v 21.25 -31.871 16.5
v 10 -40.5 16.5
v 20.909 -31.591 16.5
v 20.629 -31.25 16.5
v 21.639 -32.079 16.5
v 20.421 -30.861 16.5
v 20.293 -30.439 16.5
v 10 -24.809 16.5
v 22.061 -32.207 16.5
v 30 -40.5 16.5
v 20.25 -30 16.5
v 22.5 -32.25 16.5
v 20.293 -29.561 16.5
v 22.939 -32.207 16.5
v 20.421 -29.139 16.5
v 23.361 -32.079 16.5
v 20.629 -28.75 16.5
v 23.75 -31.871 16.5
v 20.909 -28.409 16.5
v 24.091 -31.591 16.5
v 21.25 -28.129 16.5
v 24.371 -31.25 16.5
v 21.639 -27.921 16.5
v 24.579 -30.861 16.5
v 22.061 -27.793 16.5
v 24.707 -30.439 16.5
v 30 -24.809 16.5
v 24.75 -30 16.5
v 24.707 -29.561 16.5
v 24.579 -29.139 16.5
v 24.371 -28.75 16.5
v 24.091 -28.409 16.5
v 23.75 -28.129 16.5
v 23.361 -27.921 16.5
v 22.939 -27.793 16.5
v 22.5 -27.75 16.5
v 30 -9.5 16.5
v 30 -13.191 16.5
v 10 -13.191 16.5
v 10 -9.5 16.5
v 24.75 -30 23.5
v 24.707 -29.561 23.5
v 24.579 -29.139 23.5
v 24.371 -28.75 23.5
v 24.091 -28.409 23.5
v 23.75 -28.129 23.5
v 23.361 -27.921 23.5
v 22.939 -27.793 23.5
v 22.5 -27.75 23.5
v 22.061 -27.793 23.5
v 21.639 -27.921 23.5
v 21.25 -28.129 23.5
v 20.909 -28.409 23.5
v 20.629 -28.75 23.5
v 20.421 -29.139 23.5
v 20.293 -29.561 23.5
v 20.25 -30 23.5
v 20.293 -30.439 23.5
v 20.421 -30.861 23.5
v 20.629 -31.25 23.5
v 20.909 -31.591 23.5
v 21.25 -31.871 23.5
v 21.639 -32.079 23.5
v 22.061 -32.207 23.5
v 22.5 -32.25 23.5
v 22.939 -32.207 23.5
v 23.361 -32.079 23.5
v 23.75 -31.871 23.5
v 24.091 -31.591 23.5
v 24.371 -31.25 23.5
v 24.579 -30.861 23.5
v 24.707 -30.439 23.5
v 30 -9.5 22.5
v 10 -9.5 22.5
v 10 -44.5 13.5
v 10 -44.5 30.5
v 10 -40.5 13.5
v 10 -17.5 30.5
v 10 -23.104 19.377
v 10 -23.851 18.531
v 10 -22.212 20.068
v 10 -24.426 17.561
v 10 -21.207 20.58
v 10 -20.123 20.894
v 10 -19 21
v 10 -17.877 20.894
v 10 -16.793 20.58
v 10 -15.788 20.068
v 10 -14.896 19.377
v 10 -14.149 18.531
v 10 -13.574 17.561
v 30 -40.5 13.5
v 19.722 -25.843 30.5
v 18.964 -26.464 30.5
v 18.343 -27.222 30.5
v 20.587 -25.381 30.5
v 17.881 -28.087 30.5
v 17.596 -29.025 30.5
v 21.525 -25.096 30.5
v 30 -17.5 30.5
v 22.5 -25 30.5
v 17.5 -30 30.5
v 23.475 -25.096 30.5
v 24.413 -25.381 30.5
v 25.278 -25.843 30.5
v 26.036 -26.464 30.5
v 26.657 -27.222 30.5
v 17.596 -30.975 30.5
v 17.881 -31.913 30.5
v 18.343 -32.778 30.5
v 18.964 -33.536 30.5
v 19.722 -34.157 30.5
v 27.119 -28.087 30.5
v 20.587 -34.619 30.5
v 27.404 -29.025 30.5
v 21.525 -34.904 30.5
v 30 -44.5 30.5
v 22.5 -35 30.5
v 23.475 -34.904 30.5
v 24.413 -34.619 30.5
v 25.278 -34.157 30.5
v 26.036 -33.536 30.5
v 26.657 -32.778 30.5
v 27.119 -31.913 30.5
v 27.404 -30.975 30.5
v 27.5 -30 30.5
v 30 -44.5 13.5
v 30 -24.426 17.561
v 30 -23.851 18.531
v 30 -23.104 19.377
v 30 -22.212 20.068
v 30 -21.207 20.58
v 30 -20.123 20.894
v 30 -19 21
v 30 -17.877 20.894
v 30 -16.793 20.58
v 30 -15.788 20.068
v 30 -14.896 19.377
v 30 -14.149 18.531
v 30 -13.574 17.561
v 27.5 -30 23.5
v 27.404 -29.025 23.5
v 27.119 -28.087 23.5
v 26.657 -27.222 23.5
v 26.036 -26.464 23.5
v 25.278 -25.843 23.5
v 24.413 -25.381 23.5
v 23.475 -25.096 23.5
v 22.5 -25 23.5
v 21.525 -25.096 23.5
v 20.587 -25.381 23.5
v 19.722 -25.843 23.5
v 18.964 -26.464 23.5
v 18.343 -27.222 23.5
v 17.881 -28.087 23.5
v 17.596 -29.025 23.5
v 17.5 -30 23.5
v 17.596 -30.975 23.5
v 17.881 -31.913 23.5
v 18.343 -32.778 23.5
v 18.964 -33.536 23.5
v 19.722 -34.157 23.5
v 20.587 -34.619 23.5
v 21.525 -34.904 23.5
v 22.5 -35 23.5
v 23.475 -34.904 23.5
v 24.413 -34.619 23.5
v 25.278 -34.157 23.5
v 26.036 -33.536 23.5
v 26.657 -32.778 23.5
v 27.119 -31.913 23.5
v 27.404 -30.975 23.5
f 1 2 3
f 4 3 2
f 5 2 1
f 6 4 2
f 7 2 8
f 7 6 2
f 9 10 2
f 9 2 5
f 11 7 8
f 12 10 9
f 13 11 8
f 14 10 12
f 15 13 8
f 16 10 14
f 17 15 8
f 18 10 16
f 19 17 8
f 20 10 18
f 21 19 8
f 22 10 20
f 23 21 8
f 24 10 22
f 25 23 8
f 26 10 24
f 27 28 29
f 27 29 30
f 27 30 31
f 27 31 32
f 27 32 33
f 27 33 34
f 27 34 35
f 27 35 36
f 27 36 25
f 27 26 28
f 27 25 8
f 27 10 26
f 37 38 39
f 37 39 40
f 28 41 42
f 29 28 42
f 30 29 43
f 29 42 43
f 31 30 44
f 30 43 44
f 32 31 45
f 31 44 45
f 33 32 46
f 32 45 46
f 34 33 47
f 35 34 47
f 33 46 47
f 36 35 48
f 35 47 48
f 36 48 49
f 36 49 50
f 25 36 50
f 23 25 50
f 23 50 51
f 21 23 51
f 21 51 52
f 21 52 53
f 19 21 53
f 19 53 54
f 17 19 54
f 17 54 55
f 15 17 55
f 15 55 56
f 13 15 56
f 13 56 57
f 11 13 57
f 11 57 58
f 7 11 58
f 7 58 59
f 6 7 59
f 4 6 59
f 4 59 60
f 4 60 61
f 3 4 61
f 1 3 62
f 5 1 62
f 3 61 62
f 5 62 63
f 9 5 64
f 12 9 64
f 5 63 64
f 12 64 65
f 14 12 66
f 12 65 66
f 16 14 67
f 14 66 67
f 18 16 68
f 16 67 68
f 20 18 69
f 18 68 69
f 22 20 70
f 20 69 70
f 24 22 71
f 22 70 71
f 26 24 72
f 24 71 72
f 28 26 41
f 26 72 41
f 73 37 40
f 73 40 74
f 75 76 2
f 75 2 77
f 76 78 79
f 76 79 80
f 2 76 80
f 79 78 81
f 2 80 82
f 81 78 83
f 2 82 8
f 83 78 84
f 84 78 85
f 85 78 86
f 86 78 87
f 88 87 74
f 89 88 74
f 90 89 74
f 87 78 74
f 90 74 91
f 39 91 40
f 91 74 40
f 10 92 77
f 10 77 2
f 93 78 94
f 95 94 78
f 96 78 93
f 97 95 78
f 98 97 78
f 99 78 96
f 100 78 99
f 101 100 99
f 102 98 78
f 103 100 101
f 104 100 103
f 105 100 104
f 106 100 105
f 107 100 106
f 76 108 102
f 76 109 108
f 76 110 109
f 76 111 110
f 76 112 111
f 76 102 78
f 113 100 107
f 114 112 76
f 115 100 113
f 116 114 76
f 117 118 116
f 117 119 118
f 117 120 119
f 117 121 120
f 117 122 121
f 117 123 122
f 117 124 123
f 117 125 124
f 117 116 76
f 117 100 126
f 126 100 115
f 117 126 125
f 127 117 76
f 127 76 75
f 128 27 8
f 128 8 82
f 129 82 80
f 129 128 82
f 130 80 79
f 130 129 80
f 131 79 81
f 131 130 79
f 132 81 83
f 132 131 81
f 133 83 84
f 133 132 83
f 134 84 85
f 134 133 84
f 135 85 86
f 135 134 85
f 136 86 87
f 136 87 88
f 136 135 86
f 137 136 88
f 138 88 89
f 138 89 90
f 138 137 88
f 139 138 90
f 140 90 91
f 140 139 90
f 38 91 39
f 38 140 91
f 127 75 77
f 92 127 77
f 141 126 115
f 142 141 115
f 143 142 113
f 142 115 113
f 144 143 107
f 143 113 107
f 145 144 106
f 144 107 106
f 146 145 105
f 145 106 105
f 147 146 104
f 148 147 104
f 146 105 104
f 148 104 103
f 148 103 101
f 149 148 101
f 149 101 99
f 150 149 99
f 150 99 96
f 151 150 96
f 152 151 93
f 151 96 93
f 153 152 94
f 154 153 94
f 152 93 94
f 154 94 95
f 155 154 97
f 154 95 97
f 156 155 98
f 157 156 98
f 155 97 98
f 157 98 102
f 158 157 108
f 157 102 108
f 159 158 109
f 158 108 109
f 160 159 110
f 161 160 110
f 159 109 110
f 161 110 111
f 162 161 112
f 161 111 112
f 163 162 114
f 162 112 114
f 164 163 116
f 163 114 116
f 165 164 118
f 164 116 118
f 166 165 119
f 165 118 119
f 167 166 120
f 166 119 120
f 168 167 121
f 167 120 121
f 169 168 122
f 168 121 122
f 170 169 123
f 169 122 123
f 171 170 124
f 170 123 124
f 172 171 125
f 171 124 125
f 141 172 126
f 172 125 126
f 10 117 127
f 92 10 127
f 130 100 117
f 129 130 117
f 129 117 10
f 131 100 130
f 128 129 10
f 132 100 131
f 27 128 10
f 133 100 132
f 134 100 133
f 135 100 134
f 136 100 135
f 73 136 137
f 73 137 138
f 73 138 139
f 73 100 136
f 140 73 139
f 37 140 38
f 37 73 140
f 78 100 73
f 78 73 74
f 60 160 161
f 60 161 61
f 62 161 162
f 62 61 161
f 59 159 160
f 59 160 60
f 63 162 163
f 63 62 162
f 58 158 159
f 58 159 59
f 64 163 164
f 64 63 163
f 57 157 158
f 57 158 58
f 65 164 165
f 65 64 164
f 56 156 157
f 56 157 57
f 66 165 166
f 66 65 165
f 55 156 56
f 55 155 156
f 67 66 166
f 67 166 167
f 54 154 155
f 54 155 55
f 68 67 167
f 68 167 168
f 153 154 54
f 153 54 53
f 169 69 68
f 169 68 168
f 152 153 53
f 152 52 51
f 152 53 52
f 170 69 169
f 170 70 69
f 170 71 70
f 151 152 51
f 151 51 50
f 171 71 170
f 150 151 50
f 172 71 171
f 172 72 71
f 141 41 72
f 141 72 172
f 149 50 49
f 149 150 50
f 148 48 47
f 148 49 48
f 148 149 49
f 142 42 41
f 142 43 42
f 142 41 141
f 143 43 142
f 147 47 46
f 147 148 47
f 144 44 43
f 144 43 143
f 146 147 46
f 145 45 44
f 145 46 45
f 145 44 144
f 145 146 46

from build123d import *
from build123d.topology import SkipClean

# Parameters (mm, degrees)
SKETCH1_W           = 30
SKETCH1_H           = 59
SKETCH1_R           = 7
BOSS_EXTRUDE1_DEPTH = 30
CUT_EXTRUDE1_START  = -14.5
SKETCH2_W           = 30
SKETCH2_H           = 2
CUT_EXTRUDE1_DEPTH  = 4
BOSS_EXTRUDE2_START = 12
SKETCH4_W           = 45
SKETCH4_H           = 59
SKETCH4_R           = 7
BOSS_EXTRUDE2_DEPTH = 12
SKETCH5_R           = 8
CUT_EXTRUDE3_DEPTH  = 8.5
SKETCH8_R           = 10
CUT_EXTRUDE5_DEPTH  = 3.5
BOSS_EXTRUDE4_START = 1.5
BOSS_EXTRUDE4_DEPTH = 1.5
SKETCH12_R          = 6
CUT_EXTRUDE7_DEPTH  = 22
CHAMFER1_SIZE       = 2
MOVE_FACE1_BY       = 1
SKETCH16_W          = 1
SKETCH16_H          = 8
BOSS_EXTRUDE5_DEPTH = 15
SKETCH14_R          = 2.25
CUT_EXTRUDE9_DEPTH  = 70.083283072
BOSS_EXTRUDE6_DEPTH = 20
SKETCH18_R          = 5
CUT_EXTRUDE10_DEPTH = 3
SKETCH19_R          = 2.25
CUT_EXTRUDE11_DEPTH = 81.873357789
SKETCH20_R          = 5
CUT_EXTRUDE12_DEPTH = 7
CHAMFER2_SIZE       = 8
CUT_EXTRUDE13_DEPTH = 2
SKETCH22_R          = 3.3
CUT_EXTRUDE14_DEPTH = 15
CUT_EXTRUDE15_START = -3
CUT_EXTRUDE15_DEPTH = 7
SKETCH24_W          = 8
SKETCH24_H          = 4
SKETCH24_W_2        = 4
SKETCH24_H_2        = 8
BOSS_EXTRUDE7_DEPTH = 4
CUT_EXTRUDE16_START = -31.5
CUT_EXTRUDE16_DEPTH = 31.5


with BuildPart() as part:
    # Sketch1 → Boss-Extrude1 (new body)
    with BuildSketch(Plane.XY):
        with Locations((0, -15)):
            Rectangle(SKETCH1_W, SKETCH1_H)
        Circle(SKETCH1_R, mode=Mode.SUBTRACT)
    extrude(amount=-BOSS_EXTRUDE1_DEPTH)

    # Sketch2 → Cut-Extrude1 (cut, symmetric)
    with BuildSketch(Plane.XZ.offset(44.5).offset(CUT_EXTRUDE1_START)):
        with Locations((0, -29)):
            Rectangle(SKETCH2_W, SKETCH2_H)
    extrude(amount=CUT_EXTRUDE1_DEPTH, both=True, mode=Mode.SUBTRACT)

    # Sketch4 → Boss-Extrude2 (add)
    with BuildSketch(Plane.XY.offset(BOSS_EXTRUDE2_START)):
        with Locations((7.5, -15)):
            Rectangle(SKETCH4_W, SKETCH4_H)
        Circle(SKETCH4_R, mode=Mode.SUBTRACT)
    extrude(amount=-BOSS_EXTRUDE2_DEPTH)

    # Sketch5 → Cut-Extrude3 (cut)
    with BuildSketch(Plane.XY.offset(12)):
        Circle(SKETCH5_R)
    extrude(amount=-CUT_EXTRUDE3_DEPTH, mode=Mode.SUBTRACT)

    # Sketch8 → Cut-Extrude5 (cut)
    with BuildSketch(Plane.XY.offset(12)):
        Circle(SKETCH8_R)
    extrude(amount=-CUT_EXTRUDE5_DEPTH, mode=Mode.SUBTRACT)

    # Sketch11 → Boss-Extrude4 (add)
    with SkipClean():  # the faces are left unmerged after this step: merging them gives an invalid solid
        with BuildSketch(Plane.XY.offset(12).offset(BOSS_EXTRUDE4_START)):
            with BuildLine():
                Line((30, 14.5), (8, 14.5))
                Line((8, 14.5), (8, 6))
                ThreePointArc((8, 6), (10, 0), (8, -6))
                Line((8, -6), (8, -44.5))
                Line((8, -44.5), (30, -44.5))
                Line((30, -44.5), (30, 14.5))
            make_face()
        extrude(amount=-BOSS_EXTRUDE4_DEPTH)

    # Sketch12 → Cut-Extrude7 (cut)
    with SkipClean():  # the faces are left unmerged after this step: merging them gives an invalid solid
        with BuildSketch(Plane(origin=(30, 0, 0), x_dir=(0, 0, -1), z_dir=(1, 0, 0))):
            with Locations((-15, -19)):
                Circle(SKETCH12_R)
        extrude(amount=-CUT_EXTRUDE7_DEPTH, mode=Mode.SUBTRACT)

    # Chamfer1
    # the kernel refuses this chamfer: 2 mm, written as the material it adds along each edge
    with BuildSketch(Plane(origin=(8, -19.052786447, 12), x_dir=(-0.9996219169112968, 0, -0.027495876610586487), z_dir=(0, -1, 0))) as chamfer1_piece_1_section:
        Polygon((CHAMFER1_SIZE * 0.999621916911, -CHAMFER1_SIZE * 0.0274958766106), (-CHAMFER1_SIZE * 0.0274958766106, -CHAMFER1_SIZE * 0.999621916911), (0, 0), align=None)
    chamfer1_piece_1 = extrude(amount=25.447213553, mode=Mode.PRIVATE)
    chamfer1_piece_1 = chamfer1_piece_1 - Plane(origin=(7.298262976, -19, 15), x_dir=(0, 0, -1), z_dir=(1, 0, 0)) * Cylinder(6, 59, mode=Mode.PRIVATE)
    chamfer1_piece_1 = split(chamfer1_piece_1, bisect_by=Plane(origin=(7.298262976, -34.489945177, 13.5), z_dir=(0, 0, -1)), keep=Keep.TOP, mode=Mode.PRIVATE)
    add(chamfer1_piece_1)
    with BuildSketch(Plane(origin=(8, 14.5, 12), x_dir=(-0.9996219169112968, 0, -0.027495876610586487), z_dir=(0, -1, 0))) as chamfer1_piece_2_section:
        Polygon((CHAMFER1_SIZE * 0.999621916911, -CHAMFER1_SIZE * 0.0274958766106), (-CHAMFER1_SIZE * 0.0274958766106, -CHAMFER1_SIZE * 0.999621916911), (0, 0), align=None)
    chamfer1_piece_2 = extrude(amount=13.643365976, mode=Mode.PRIVATE)
    chamfer1_piece_2 = chamfer1_piece_2 - Plane(origin=(0, 0, 12.610971558), x_dir=(1, 0, 0), z_dir=(0, 0, 1)) * Cylinder(10, 36, mode=Mode.PRIVATE)
    chamfer1_piece_2 = split(chamfer1_piece_2, bisect_by=Plane(origin=(7.329577736, 10.634975656, 13.5), z_dir=(0, 0, -1)), keep=Keep.TOP, mode=Mode.PRIVATE)
    add(chamfer1_piece_2)
    with BuildSketch(Plane(origin=(8, -0.856634024, 12), x_dir=(-0.9996219169112968, 0, -0.027495876610586487), z_dir=(0, -1, 0))) as chamfer1_piece_3_section:
        Polygon((CHAMFER1_SIZE * 0.999621916911, -CHAMFER1_SIZE * 0.0274958766106), (-CHAMFER1_SIZE * 0.0274958766106, -CHAMFER1_SIZE * 0.999621916911), (0, 0), align=None)
    chamfer1_piece_3 = extrude(amount=18.090579529, mode=Mode.PRIVATE)
    chamfer1_piece_3 = chamfer1_piece_3 - Plane(origin=(7.328722349, -19, 15), x_dir=(0, 0, -1), z_dir=(1, 0, 0)) * Cylinder(6, 45, mode=Mode.PRIVATE)
    chamfer1_piece_3 = chamfer1_piece_3 - Plane(origin=(0, 0, 12.602221716), x_dir=(1, 0, 0), z_dir=(0, 0, 1)) * Cylinder(10, 45, mode=Mode.PRIVATE)
    chamfer1_piece_3 = split(chamfer1_piece_3, bisect_by=Plane(origin=(7.328722349, -10.144229593, 13.5), z_dir=(0, 0, -1)), keep=Keep.TOP, mode=Mode.PRIVATE)
    add(chamfer1_piece_3)

    # Move Face1: a face moved outward by 1.0
    extrude(part.faces().sort_by_distance((8, -19, 10.769879029))[0], amount=MOVE_FACE1_BY, dir=(1, 0, 0))

    # Sketch16 → Boss-Extrude5 (add)
    with BuildSketch(Plane(origin=(30, 0, 0), x_dir=(0, 0, -1), z_dir=(1, 0, 0))):
        with Locations((0.5, 0)):
            Rectangle(SKETCH16_W, SKETCH16_H)
        with Locations((0.5, -30)):
            Rectangle(SKETCH16_W, SKETCH16_H)
    extrude(amount=-BOSS_EXTRUDE5_DEPTH)

    # Sketch14 → Cut-Extrude9 (cut, through all)
    with BuildSketch(Plane.XY.offset(13.5)):
        with Locations((22.5, 0)):
            Circle(SKETCH14_R)
        with Locations((22.5, -30)):
            Circle(SKETCH14_R)
    extrude(amount=-CUT_EXTRUDE9_DEPTH, mode=Mode.SUBTRACT)

    # Sketch18 → Cut-Extrude10 (cut)
    with BuildSketch(Plane.XY.offset(13.5)):
        with Locations((22.5, 0)):
            Circle(SKETCH18_R)
    extrude(amount=-CUT_EXTRUDE10_DEPTH, mode=Mode.SUBTRACT)

    # Sketch21 → Cut-Extrude13 (cut)
    with BuildSketch(Plane(origin=(15, 0, 0), x_dir=(0, 0, -1), z_dir=(1, 0, 0))):
        Polygon((0, 9), (10, 9), (10, -9), (0, -9), (0, -4), (1, -4), (1, 4), (0, 4), align=None)
        Polygon((0, -21), (10, -21), (10, -39), (0, -39), (0, -34), (1, -34), (1, -26), (0, -26), align=None)
    extrude(amount=-CUT_EXTRUDE13_DEPTH, mode=Mode.SUBTRACT)

    # Sketch22 → Cut-Extrude14 (cut)
    with BuildSketch(Plane(origin=(0, 0, -28), x_dir=(-1, 0, 0), z_dir=(0, 0, -1))):
        with Locations((-0.001598667, -30)):
            Circle(SKETCH22_R)
    extrude(amount=-CUT_EXTRUDE14_DEPTH, mode=Mode.SUBTRACT)

    # Sketch23 → Cut-Extrude15 (cut)
    with BuildSketch(Plane(origin=(0, 0, -28), x_dir=(-1, 0, 0), z_dir=(0, 0, -1)).offset(CUT_EXTRUDE15_START)):
        Polygon((-5.101598667, -32.944486373), (-5.101598667, -44.5), (5.098401333, -44.5), (5.098401333, -32.944486373), (5.098401333, -27.055513627), (-0.001598667, -24.111027254), (-5.101598667, -27.055513627), align=None)
    extrude(amount=-CUT_EXTRUDE15_DEPTH, mode=Mode.SUBTRACT)

    # Sketch24 → Boss-Extrude7 (add)
    with BuildSketch(Plane(origin=(15, 0, 0), x_dir=(0, 0, -1), z_dir=(1, 0, 0))):
        with Locations((15, 12.5)):
            Rectangle(SKETCH24_W, SKETCH24_H)
        with Locations((28, 0)):
            Rectangle(SKETCH24_W_2, SKETCH24_H_2)
    extrude(amount=BOSS_EXTRUDE7_DEPTH)

    # Sketch25 → Cut-Extrude16 (cut)
    with BuildSketch(Plane(origin=(0, 0, -30), x_dir=(-1, 0, 0), z_dir=(0, 0, -1)).offset(CUT_EXTRUDE16_START)):
        with BuildLine():
            Line((-8.191520443, 5.735764364), (-12.207745888, 0))
            Line((-12.207745888, 0), (-8.191520443, -5.735764364))
            ThreePointArc((-8.191520443, -5.735764364), (10, 0), (-8.191520443, 5.735764364))
        make_face()
    extrude(amount=CUT_EXTRUDE16_DEPTH, mode=Mode.SUBTRACT)


with BuildPart() as body_2:
    # Sketch17 → Boss-Extrude6 (new body)
    with BuildSketch(Plane(origin=(30, 0, 0), x_dir=(0, 0, -1), z_dir=(1, 0, 0))):
        with BuildLine():
            Line((-16.5, -13.190524981), (-16.5, -9.5))
            Line((-16.5, -9.5), (-30.5, -9.5))
            Line((-30.5, -9.5), (-30.5, -44.5))
            Line((-30.5, -44.5), (-13.5, -44.5))
            Line((-13.5, -44.5), (-13.5, -40.5))
            Line((-13.5, -40.5), (-16.5, -40.5))
            Line((-16.5, -40.5), (-16.5, -24.809475019))
            ThreePointArc((-16.5, -24.809475019), (-21, -19), (-16.5, -13.190524981))
        make_face()
    extrude(amount=-BOSS_EXTRUDE6_DEPTH)

    # Sketch19 → Cut-Extrude11 (cut, through all)
    with BuildSketch(Plane.XY.offset(30.5)):
        with Locations((22.5, -30)):
            Circle(SKETCH19_R)
    extrude(amount=-CUT_EXTRUDE11_DEPTH, mode=Mode.SUBTRACT)

    # Sketch20 → Cut-Extrude12 (cut)
    with BuildSketch(Plane.XY.offset(30.5)):
        with Locations((22.5, -30)):
            Circle(SKETCH20_R)
    extrude(amount=-CUT_EXTRUDE12_DEPTH, mode=Mode.SUBTRACT)

    # Chamfer2
    chamfer2_edges = [body_2.edges().sort_by_distance(p)[0] for p in [
        (20, -9.5, 30.5),
    ]]
    chamfer(chamfer2_edges, length=CHAMFER2_SIZE)


solid = body_2.part
